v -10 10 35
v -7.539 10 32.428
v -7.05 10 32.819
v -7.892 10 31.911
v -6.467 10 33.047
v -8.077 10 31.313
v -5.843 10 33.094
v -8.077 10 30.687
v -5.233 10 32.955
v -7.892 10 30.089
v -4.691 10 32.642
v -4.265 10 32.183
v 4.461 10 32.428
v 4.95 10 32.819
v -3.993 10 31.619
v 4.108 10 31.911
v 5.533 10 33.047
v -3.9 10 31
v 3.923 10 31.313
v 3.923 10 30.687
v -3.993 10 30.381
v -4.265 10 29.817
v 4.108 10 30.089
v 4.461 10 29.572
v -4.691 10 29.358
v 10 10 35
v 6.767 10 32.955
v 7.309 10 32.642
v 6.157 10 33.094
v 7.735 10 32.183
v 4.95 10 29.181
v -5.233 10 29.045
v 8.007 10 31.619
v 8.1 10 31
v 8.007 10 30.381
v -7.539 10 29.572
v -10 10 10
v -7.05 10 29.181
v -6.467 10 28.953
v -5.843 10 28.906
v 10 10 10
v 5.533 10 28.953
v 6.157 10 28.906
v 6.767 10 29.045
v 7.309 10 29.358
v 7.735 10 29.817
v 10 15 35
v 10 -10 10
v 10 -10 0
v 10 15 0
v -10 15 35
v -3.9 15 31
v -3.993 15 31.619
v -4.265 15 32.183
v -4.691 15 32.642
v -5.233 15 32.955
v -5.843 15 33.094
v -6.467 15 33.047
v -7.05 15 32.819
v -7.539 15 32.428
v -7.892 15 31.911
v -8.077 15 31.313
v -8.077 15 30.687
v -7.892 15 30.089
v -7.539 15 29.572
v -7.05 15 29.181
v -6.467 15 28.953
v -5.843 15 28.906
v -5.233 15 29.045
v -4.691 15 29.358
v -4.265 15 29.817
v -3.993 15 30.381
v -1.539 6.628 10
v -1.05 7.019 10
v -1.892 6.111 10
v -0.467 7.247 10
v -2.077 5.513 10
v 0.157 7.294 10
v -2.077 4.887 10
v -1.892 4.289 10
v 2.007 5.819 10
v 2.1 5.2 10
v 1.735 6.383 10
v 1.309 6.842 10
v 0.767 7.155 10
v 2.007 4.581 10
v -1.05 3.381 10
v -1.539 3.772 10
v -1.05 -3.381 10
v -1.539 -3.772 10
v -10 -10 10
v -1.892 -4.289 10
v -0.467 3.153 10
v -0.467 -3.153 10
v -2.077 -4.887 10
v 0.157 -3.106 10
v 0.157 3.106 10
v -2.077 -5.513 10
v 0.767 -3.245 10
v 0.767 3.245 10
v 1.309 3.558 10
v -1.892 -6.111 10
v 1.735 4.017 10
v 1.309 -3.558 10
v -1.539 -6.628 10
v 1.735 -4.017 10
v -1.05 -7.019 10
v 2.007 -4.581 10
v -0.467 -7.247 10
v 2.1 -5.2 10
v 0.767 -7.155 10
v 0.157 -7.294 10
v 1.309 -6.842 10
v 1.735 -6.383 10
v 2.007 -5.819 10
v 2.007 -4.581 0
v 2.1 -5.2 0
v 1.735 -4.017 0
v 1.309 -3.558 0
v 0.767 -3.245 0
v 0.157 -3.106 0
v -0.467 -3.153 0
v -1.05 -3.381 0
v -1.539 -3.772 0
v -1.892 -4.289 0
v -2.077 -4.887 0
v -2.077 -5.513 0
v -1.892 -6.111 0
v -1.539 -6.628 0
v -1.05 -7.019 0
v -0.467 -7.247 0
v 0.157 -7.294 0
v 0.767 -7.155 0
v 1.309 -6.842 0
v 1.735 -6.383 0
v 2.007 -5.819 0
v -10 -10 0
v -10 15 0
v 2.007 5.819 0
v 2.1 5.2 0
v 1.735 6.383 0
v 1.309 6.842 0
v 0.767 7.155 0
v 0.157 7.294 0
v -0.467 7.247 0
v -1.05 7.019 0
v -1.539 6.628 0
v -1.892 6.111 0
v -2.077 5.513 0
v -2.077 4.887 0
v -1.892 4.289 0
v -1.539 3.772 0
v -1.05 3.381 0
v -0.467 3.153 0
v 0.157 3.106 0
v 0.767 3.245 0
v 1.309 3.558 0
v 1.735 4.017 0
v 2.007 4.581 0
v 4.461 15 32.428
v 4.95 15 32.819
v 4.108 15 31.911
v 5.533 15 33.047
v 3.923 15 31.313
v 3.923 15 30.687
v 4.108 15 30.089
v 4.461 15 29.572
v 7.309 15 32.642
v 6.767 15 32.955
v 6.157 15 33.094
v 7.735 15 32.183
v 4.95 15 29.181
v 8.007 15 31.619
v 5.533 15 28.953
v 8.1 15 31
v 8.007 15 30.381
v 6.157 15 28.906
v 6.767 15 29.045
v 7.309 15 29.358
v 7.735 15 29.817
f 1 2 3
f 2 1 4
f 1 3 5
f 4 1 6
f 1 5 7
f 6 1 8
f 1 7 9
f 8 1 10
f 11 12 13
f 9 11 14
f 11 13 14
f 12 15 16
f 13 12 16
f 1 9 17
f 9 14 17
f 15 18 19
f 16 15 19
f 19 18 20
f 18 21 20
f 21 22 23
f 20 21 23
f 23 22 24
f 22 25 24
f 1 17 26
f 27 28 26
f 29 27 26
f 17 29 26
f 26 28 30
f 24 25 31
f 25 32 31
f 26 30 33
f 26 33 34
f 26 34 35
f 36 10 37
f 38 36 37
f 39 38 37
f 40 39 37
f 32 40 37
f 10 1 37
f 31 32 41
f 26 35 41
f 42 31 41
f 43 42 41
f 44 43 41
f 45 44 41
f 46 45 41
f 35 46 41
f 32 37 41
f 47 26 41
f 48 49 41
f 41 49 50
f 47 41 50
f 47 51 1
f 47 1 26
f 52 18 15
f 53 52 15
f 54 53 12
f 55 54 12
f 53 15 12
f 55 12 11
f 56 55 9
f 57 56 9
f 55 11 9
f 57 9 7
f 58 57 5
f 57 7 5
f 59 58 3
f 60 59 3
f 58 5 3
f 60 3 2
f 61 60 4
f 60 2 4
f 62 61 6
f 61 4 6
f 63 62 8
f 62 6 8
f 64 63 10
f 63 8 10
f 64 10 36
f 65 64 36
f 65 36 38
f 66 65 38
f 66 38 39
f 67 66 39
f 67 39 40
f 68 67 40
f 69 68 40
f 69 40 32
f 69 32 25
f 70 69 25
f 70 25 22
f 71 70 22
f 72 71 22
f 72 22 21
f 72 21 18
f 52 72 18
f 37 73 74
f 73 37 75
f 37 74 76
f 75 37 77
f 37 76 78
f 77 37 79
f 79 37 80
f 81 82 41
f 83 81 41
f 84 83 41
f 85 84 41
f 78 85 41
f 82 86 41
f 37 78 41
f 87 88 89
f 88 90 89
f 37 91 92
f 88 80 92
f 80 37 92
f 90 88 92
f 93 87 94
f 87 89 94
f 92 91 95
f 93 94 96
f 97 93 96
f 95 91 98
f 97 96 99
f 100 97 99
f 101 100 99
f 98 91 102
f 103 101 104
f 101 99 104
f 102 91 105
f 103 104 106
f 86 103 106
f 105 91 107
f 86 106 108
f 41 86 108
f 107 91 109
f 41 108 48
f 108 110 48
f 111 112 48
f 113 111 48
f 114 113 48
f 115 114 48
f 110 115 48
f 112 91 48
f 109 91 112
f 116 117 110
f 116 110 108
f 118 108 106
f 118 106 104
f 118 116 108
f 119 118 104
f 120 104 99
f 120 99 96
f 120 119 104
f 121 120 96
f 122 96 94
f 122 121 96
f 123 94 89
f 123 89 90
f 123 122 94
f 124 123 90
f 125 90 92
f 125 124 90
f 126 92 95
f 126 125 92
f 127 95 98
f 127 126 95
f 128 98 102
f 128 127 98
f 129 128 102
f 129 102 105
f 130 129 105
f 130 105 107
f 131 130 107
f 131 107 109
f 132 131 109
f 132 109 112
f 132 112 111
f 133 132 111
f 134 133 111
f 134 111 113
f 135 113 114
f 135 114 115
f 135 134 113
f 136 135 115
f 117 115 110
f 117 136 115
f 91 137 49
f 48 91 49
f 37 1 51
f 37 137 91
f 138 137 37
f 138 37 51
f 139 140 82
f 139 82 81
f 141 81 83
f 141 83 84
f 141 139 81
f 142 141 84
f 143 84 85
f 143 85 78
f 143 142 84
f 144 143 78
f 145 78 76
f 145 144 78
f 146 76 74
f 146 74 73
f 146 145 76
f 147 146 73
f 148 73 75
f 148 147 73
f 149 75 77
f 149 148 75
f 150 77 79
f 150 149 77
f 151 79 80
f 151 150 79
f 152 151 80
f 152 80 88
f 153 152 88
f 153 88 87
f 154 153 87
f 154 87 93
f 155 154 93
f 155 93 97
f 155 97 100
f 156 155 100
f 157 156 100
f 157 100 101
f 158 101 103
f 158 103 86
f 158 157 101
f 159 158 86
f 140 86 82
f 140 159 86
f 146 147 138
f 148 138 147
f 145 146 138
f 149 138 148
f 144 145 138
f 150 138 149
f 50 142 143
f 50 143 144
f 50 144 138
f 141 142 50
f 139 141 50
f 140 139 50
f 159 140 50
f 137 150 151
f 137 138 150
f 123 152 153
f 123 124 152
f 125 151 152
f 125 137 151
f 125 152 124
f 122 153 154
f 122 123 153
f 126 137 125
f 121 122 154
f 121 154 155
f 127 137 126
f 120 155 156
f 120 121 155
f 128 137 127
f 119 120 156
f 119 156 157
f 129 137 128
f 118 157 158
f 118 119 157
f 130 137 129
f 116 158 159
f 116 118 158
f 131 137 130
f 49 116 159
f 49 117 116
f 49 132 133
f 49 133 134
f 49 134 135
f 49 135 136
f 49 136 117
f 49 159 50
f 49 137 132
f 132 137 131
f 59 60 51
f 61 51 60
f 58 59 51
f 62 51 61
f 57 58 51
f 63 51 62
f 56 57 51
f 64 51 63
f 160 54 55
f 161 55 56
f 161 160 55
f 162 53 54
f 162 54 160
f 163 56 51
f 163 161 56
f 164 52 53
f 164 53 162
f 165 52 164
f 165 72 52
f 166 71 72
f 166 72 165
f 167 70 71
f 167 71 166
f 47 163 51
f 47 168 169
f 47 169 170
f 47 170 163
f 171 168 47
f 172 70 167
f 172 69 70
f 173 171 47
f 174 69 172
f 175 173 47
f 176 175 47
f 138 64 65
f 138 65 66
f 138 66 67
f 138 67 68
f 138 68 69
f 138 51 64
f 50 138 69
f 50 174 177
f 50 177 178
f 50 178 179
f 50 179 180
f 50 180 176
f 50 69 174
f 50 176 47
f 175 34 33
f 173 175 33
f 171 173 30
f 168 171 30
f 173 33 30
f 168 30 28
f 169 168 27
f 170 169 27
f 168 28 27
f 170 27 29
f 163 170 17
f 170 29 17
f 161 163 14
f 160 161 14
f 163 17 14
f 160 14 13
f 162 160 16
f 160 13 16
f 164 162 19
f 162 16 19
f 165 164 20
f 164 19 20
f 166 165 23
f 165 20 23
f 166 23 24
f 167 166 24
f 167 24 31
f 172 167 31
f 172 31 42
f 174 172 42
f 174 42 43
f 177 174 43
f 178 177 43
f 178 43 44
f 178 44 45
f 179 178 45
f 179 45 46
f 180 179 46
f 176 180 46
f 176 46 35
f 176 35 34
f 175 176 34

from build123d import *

# Parameters (mm, degrees)
SKETCH_1_W          = 20
SKETCH_1_H          = 20
SKETCH_1_R          = 2.1
EXTRUDE_1_DEPTH     = 10
SKETCH_2_W          = 20
SKETCH_2_H          = 10
EXTRUDE_2_DEPTH     = 5
SKETCH_3_W          = 20
SKETCH_3_H          = 5
EXTRUDE_3_DEPTH     = 25
SKETCH_4_R          = 2.1
CUT_EXTRUDE_1_DEPTH = 25


with BuildPart() as part:
    # 草图1 → 凸台-拉伸1 (new body)
    with BuildSketch(Plane.XY):
        Rectangle(SKETCH_1_W, SKETCH_1_H)
        with Locations((0, 5.2)):
            Circle(SKETCH_1_R, mode=Mode.SUBTRACT)
        with Locations((0, -5.2)):
            Circle(SKETCH_1_R, mode=Mode.SUBTRACT)
    extrude(amount=EXTRUDE_1_DEPTH)

    # 草图2 → 凸台-拉伸2 (add)
    with BuildSketch(Plane(origin=(0, 10, 0), x_dir=(1, 0, 0), z_dir=(0, 1, 0))):
        with Locations((0, -5)):
            Rectangle(SKETCH_2_W, SKETCH_2_H)
    extrude(amount=EXTRUDE_2_DEPTH)

    # 草图3 → 凸台-拉伸3 (add)
    with BuildSketch(Plane.XY.offset(10)):
        with Locations((0, 12.5)):
            Rectangle(SKETCH_3_W, SKETCH_3_H)
    extrude(amount=EXTRUDE_3_DEPTH)

    # 草图4 → 切除-拉伸1 (cut)
    with BuildSketch(Plane.XZ.offset(-10)):
        with Locations((-6, 31)):
            Circle(SKETCH_4_R)
        with Locations((6, 31)):
            Circle(SKETCH_4_R)
    extrude(amount=-CUT_EXTRUDE_1_DEPTH, mode=Mode.SUBTRACT)


solid = part.part
